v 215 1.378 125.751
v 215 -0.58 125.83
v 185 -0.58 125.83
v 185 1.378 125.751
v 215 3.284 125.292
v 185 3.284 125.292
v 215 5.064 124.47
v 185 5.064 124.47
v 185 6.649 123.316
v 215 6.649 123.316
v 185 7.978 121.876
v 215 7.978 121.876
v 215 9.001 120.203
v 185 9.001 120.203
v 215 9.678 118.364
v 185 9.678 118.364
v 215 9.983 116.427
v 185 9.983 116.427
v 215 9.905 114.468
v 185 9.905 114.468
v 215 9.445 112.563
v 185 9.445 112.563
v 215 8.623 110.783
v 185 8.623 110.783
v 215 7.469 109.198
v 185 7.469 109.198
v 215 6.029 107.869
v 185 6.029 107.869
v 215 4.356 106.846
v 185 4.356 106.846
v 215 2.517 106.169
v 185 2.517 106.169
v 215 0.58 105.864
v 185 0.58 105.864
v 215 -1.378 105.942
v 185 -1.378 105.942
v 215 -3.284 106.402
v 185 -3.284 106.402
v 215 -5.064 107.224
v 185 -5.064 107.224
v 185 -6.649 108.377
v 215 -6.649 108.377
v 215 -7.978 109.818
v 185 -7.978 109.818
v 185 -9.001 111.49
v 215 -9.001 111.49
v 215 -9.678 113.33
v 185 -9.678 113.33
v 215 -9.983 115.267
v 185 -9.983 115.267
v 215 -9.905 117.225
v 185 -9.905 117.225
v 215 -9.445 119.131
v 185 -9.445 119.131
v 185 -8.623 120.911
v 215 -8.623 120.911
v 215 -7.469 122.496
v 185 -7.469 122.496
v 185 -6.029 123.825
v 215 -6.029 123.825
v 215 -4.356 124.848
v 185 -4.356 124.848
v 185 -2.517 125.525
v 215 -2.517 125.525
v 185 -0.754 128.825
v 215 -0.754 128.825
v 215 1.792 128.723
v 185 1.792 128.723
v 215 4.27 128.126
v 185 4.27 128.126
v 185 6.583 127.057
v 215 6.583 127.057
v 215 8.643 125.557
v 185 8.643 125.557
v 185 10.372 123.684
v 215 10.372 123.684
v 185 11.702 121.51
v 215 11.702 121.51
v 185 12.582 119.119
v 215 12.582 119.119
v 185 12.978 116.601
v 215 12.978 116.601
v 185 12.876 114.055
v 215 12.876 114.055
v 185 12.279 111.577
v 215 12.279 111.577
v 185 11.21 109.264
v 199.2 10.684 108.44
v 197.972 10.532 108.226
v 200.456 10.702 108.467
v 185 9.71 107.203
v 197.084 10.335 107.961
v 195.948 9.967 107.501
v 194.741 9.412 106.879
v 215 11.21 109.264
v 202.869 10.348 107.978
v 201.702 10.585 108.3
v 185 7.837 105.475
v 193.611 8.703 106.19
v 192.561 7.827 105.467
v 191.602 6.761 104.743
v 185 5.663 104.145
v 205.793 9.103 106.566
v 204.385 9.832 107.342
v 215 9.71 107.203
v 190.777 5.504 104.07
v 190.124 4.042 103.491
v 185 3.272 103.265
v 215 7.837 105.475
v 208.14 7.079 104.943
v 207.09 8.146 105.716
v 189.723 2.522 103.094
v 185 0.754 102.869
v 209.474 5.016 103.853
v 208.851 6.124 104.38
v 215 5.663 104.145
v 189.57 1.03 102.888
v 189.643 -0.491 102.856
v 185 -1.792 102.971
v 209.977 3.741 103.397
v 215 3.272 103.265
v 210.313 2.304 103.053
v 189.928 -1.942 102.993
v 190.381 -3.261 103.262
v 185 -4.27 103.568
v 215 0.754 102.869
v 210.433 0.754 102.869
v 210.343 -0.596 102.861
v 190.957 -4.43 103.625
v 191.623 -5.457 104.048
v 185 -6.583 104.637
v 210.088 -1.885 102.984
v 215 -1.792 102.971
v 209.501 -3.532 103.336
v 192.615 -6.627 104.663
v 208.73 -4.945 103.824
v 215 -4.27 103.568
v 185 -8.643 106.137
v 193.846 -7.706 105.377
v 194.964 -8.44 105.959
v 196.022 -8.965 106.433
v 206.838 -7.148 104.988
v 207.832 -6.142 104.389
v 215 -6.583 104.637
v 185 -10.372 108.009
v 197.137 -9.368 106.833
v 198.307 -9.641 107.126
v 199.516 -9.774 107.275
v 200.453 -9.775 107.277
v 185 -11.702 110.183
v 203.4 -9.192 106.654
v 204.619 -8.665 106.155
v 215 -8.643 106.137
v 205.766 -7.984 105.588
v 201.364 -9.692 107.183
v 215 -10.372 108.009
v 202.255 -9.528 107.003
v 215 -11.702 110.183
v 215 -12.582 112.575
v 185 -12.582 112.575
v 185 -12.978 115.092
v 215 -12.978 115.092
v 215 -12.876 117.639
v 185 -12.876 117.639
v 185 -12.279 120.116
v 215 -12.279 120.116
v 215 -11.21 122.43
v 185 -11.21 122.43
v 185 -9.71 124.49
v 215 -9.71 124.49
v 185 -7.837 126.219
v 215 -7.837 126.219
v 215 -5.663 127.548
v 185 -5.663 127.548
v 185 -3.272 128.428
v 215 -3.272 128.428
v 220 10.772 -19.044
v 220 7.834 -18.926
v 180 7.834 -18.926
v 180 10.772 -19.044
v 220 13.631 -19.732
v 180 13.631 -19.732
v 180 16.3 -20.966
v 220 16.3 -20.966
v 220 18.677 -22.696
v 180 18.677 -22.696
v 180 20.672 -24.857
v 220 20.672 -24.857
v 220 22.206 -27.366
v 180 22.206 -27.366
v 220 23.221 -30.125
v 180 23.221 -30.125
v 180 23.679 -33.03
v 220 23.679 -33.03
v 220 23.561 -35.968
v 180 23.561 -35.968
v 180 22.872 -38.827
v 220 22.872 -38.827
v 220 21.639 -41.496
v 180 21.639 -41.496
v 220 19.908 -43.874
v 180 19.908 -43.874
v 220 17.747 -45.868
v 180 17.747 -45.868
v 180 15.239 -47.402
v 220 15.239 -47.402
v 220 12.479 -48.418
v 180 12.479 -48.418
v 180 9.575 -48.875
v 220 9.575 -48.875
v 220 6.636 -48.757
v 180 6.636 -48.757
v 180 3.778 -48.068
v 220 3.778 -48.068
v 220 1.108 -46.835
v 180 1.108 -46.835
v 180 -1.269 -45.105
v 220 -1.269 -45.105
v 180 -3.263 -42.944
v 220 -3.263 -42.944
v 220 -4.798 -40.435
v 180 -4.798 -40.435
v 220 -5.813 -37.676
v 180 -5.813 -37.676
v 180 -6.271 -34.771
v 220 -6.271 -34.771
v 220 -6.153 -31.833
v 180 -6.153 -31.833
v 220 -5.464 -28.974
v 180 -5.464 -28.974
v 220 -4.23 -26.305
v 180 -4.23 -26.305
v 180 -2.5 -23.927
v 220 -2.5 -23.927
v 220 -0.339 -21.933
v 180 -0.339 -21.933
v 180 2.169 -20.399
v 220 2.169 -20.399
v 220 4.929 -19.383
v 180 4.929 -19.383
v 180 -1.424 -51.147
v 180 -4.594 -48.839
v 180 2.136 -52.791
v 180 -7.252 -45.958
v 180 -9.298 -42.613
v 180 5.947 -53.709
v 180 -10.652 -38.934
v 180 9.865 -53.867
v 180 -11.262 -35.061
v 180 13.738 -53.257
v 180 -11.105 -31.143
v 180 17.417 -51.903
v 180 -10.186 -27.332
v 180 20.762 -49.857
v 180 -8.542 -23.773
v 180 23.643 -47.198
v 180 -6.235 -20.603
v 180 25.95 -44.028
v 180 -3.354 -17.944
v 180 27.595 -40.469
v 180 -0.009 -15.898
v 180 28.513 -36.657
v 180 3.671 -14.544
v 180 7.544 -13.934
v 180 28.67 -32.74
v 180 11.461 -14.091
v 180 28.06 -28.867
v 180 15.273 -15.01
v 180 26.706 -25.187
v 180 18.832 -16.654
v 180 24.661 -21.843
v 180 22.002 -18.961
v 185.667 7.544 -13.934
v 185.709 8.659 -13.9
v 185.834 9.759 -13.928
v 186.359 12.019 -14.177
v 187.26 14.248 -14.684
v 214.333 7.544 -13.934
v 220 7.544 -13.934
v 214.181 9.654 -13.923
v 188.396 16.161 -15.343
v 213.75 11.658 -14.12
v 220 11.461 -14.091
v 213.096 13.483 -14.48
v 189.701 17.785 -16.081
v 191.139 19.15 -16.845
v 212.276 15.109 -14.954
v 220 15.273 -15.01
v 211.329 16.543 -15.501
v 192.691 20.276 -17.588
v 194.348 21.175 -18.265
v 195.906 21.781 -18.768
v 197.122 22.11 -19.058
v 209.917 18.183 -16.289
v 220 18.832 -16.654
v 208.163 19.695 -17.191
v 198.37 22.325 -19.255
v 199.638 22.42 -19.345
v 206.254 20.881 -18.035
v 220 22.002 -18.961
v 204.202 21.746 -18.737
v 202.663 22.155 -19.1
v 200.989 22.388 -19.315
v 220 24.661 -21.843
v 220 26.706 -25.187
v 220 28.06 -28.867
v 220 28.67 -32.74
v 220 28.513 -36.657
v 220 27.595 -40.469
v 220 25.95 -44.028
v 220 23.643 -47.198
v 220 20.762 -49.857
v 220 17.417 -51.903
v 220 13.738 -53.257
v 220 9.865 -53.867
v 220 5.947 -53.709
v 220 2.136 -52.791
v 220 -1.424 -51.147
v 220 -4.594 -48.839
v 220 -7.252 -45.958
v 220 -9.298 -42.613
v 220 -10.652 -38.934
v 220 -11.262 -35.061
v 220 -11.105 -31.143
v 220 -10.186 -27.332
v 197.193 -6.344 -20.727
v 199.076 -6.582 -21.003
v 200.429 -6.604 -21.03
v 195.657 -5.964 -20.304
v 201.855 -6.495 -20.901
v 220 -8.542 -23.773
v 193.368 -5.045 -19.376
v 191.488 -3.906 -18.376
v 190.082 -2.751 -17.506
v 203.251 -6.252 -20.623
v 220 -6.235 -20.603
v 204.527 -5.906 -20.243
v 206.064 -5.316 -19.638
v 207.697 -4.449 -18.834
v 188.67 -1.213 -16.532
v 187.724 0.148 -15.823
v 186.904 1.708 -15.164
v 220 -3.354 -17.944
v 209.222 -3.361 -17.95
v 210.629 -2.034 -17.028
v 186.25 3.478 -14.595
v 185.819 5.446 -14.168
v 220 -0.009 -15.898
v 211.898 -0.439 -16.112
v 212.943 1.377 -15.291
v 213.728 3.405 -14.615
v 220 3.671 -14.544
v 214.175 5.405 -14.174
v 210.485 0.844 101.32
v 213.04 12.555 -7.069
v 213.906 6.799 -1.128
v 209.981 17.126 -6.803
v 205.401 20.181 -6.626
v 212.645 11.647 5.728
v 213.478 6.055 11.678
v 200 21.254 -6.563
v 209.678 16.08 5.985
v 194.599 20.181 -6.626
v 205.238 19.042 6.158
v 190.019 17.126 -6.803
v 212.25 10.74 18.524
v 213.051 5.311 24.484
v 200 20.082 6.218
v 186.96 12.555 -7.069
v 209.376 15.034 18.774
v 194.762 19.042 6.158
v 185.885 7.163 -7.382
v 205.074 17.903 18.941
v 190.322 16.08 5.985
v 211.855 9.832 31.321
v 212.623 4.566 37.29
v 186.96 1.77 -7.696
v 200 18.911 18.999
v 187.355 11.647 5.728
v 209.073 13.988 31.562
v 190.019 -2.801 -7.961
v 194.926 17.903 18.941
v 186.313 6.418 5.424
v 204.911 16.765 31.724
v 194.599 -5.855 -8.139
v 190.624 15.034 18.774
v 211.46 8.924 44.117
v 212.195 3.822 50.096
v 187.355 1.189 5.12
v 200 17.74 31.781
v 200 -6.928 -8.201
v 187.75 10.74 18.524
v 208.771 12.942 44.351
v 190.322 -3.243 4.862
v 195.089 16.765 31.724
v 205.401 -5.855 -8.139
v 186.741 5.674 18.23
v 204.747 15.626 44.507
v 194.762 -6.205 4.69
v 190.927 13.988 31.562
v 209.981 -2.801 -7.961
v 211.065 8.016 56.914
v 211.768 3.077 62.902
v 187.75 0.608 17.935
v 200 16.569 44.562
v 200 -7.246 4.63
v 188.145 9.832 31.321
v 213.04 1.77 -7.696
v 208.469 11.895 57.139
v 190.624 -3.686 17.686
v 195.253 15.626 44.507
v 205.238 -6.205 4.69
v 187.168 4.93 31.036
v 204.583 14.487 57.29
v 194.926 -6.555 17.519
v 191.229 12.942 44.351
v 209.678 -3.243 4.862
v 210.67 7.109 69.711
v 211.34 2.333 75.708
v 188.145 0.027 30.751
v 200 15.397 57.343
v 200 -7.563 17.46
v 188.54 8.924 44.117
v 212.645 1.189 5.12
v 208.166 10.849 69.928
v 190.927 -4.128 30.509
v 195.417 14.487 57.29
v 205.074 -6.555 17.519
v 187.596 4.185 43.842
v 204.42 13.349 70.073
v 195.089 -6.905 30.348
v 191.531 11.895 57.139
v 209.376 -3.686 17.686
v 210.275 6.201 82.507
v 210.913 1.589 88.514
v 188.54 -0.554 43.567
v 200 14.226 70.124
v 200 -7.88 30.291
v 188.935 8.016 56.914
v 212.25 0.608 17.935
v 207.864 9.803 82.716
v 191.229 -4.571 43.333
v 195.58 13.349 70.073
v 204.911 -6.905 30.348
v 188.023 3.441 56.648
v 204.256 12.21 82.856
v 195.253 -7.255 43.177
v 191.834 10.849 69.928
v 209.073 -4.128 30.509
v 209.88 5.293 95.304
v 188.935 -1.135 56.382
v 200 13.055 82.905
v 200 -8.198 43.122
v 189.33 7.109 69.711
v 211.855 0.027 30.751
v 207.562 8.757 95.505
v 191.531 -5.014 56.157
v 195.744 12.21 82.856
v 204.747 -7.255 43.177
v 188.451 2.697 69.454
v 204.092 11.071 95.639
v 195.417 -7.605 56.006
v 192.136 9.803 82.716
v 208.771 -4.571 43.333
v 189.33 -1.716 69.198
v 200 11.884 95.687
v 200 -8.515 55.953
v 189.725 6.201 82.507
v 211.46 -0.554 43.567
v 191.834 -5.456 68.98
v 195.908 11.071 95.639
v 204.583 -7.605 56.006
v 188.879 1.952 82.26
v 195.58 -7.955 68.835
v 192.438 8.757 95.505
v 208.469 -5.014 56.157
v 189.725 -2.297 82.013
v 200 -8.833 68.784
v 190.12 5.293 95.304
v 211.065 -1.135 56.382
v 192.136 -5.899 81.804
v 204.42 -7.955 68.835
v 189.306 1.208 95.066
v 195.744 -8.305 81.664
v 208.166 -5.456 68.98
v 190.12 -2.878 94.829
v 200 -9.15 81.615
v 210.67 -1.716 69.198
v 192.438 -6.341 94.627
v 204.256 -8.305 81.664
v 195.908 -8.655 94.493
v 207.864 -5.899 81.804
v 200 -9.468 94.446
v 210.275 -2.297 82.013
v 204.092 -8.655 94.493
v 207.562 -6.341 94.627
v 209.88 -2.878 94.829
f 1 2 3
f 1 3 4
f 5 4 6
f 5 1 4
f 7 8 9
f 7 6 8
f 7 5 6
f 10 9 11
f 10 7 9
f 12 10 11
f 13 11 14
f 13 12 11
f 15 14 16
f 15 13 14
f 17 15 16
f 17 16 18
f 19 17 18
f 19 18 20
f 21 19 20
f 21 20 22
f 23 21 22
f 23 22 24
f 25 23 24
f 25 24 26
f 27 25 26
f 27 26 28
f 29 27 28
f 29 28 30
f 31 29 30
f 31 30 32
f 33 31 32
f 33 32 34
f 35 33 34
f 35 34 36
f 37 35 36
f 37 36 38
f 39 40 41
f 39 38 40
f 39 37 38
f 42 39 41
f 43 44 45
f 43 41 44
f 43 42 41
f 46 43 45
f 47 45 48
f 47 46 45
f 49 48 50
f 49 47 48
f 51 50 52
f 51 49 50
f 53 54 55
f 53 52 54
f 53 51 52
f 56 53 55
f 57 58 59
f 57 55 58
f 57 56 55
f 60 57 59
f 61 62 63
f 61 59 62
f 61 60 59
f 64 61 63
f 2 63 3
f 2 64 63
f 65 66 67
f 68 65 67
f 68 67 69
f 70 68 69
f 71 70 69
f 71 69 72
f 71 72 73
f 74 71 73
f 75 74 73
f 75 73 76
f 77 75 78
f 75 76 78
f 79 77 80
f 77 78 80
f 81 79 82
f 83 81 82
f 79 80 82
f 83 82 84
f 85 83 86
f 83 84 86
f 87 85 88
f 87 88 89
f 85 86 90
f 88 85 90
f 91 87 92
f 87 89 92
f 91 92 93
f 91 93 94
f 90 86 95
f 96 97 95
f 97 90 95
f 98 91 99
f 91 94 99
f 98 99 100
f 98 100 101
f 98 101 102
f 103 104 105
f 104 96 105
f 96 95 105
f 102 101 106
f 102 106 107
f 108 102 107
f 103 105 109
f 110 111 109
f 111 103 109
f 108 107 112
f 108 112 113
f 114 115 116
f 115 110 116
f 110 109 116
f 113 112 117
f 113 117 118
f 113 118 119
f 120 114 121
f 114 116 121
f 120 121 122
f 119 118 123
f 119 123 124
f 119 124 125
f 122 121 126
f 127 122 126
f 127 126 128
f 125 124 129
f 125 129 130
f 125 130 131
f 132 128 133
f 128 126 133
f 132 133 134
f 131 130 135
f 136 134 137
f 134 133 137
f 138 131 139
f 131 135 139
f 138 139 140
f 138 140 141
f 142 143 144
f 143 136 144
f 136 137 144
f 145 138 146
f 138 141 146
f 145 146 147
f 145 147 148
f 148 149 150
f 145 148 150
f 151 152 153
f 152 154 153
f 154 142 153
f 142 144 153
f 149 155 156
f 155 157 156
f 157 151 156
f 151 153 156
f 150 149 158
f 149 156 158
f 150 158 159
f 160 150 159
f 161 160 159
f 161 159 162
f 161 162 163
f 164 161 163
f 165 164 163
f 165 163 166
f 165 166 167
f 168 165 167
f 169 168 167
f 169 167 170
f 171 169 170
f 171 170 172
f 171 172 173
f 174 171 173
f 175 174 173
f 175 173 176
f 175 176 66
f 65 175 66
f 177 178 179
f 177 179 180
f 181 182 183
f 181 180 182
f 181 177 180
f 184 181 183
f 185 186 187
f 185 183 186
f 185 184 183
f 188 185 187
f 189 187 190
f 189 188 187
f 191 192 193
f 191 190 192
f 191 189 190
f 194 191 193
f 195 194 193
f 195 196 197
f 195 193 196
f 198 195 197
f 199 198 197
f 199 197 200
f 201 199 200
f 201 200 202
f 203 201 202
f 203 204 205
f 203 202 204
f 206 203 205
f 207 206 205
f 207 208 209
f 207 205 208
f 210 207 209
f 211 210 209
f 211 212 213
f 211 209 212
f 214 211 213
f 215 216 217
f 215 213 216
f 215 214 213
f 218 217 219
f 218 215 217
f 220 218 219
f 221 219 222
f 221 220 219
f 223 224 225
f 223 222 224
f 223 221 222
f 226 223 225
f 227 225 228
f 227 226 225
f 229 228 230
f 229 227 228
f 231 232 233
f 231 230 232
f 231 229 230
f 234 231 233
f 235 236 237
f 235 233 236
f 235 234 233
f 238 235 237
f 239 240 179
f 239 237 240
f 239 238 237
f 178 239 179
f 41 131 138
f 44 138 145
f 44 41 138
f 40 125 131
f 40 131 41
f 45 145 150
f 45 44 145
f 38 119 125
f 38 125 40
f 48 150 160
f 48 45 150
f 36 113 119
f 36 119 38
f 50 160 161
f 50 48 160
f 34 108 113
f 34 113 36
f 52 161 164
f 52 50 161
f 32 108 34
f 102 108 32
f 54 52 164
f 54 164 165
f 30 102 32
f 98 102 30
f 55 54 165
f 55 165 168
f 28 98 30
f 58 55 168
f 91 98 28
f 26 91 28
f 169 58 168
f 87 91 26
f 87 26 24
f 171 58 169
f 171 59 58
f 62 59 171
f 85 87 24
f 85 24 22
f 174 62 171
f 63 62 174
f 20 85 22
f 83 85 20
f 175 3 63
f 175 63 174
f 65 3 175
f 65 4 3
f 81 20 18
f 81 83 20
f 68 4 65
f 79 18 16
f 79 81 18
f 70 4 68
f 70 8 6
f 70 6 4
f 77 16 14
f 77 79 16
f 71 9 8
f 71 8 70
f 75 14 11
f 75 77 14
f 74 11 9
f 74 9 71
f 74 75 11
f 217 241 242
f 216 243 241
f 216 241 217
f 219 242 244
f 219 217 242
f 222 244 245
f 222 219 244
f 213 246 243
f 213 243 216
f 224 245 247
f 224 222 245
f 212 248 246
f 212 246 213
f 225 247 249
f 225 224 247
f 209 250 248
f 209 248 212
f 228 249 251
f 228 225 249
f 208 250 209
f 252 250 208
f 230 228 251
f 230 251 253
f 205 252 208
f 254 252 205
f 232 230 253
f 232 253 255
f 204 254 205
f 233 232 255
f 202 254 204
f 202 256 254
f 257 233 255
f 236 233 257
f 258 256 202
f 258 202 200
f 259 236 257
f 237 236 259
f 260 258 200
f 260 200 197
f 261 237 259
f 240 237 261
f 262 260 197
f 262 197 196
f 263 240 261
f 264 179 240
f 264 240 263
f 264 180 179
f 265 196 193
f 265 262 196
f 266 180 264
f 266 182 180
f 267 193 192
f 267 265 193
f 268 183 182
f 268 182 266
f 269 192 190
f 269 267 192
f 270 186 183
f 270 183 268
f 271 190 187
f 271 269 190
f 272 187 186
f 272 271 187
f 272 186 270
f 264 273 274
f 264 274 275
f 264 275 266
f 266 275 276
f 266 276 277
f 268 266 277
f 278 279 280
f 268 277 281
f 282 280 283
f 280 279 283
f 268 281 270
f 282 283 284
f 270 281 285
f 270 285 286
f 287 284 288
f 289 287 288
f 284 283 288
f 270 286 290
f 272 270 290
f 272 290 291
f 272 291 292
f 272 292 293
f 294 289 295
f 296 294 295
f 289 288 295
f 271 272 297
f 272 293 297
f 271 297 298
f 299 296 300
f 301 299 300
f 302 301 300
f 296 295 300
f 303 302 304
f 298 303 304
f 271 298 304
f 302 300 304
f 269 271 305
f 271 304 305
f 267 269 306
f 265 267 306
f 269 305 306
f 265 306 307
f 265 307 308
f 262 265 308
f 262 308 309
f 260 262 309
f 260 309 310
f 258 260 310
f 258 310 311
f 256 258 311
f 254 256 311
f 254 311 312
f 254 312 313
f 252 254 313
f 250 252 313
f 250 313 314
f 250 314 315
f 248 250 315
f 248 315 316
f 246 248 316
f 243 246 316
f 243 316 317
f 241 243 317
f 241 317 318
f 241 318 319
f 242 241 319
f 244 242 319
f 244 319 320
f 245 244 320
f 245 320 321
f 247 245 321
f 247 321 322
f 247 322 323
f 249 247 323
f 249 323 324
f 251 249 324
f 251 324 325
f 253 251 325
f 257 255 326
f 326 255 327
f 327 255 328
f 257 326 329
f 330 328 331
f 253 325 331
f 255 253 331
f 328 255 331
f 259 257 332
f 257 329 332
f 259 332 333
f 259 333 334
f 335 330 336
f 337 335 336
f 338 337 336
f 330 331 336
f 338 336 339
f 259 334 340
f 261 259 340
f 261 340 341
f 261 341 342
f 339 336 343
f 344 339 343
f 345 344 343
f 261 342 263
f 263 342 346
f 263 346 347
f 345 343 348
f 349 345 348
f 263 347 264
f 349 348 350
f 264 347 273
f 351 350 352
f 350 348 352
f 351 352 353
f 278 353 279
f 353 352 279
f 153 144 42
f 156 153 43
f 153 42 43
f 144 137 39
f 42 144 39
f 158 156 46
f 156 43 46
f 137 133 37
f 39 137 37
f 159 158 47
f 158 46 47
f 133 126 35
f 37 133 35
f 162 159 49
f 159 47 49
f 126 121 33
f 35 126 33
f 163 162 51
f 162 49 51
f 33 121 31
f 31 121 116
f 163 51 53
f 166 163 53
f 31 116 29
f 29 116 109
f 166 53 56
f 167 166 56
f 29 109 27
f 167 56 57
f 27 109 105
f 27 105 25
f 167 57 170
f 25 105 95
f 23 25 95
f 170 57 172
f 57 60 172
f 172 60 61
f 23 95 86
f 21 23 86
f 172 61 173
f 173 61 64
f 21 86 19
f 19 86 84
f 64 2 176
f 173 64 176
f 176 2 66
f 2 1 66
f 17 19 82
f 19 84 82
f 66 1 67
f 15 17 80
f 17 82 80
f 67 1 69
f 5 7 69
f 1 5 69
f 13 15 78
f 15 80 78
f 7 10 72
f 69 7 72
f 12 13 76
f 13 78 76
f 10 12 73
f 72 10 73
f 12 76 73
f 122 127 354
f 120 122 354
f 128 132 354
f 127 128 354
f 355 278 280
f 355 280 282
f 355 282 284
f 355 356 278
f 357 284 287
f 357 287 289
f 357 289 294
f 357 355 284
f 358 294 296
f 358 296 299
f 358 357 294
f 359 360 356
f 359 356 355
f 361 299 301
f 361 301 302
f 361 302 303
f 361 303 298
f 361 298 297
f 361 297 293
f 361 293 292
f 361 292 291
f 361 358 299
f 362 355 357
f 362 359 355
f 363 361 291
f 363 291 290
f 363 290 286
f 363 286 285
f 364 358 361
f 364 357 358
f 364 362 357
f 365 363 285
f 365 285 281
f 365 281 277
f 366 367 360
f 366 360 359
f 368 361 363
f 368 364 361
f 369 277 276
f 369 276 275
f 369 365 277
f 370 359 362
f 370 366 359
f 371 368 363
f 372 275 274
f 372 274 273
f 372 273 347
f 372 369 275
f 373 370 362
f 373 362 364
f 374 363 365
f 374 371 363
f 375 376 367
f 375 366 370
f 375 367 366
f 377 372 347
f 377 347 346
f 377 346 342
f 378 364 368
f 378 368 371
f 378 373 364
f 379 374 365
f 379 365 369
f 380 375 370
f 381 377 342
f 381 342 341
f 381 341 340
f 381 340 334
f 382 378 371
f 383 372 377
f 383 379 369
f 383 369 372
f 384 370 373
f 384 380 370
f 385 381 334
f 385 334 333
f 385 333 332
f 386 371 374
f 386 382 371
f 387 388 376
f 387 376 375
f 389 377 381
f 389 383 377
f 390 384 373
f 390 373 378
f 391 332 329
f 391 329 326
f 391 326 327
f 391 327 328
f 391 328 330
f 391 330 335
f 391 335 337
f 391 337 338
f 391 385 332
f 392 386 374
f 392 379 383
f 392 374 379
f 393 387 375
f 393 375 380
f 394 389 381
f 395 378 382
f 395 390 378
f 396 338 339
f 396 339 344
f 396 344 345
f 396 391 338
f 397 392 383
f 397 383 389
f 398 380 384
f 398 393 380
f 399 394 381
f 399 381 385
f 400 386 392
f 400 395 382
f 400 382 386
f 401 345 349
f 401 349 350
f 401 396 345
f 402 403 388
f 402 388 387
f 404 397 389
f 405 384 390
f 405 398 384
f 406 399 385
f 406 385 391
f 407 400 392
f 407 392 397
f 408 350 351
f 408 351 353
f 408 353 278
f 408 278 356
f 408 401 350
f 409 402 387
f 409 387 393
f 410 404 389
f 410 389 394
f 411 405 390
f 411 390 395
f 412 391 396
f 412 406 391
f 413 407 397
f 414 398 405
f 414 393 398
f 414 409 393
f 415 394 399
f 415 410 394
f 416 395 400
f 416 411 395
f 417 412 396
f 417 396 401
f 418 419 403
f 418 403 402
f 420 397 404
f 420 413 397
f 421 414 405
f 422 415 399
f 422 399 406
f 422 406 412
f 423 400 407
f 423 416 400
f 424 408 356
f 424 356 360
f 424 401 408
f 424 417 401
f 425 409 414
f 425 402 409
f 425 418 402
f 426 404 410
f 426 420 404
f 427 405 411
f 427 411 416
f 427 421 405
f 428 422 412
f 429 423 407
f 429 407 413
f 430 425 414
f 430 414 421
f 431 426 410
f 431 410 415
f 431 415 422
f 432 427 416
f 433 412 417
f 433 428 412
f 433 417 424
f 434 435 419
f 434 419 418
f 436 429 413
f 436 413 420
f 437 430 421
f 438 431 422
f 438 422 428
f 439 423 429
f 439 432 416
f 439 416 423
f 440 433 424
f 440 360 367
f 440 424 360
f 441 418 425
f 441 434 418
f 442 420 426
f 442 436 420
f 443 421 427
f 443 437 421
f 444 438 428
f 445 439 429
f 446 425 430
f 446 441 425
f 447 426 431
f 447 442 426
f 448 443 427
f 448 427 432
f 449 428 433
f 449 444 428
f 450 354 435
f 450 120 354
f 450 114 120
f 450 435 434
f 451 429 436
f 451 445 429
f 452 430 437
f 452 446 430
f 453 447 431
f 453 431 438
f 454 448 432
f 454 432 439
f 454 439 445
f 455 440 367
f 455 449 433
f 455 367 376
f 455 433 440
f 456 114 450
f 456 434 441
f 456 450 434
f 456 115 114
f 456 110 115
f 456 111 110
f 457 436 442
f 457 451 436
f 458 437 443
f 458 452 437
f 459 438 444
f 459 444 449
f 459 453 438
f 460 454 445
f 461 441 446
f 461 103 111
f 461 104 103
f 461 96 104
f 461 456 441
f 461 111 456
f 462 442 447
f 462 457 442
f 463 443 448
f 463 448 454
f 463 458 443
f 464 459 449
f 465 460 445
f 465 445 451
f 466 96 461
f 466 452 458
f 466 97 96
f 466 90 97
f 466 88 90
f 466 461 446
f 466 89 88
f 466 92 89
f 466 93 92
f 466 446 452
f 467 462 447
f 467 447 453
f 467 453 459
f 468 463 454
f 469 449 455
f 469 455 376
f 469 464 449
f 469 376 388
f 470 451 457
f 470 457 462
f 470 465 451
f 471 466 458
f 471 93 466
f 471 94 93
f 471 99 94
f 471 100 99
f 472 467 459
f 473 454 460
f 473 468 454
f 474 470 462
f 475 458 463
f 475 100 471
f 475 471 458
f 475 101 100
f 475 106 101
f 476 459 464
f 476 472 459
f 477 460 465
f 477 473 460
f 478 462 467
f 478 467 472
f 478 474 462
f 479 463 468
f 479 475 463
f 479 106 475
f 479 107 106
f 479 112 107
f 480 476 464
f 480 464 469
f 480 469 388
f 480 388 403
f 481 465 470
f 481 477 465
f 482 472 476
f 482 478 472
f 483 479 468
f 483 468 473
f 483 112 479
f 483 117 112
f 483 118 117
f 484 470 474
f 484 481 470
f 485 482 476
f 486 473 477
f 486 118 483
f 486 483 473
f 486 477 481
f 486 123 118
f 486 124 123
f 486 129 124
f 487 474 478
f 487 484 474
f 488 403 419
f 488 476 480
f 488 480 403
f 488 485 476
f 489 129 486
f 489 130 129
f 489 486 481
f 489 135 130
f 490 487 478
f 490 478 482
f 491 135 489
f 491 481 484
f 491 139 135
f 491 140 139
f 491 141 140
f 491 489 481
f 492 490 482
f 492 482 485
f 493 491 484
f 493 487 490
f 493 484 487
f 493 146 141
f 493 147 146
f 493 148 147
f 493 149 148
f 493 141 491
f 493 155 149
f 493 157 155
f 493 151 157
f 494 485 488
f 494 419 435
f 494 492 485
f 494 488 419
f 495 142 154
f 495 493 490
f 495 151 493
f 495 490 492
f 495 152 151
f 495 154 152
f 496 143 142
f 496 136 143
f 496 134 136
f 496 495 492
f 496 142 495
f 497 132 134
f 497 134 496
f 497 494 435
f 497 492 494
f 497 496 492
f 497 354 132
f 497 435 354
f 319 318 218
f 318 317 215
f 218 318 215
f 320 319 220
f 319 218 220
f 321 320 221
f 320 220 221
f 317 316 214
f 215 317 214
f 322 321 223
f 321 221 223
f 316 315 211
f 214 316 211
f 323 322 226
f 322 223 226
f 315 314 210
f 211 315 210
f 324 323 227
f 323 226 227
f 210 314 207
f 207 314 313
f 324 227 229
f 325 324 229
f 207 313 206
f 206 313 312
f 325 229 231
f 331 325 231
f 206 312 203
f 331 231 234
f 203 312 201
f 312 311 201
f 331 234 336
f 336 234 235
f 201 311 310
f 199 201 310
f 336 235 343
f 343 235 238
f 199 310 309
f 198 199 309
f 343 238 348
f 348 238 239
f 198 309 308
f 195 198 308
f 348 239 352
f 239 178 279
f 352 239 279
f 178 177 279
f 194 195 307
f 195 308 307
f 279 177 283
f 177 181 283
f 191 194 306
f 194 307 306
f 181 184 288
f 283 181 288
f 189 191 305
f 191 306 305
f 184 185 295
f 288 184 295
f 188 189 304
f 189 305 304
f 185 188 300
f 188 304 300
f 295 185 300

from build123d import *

# Parameters (mm, degrees)
CYLINDER027_R          = 10
CYLINDER027_DEPTH      = 100
CYLINDER028_R          = 15
CYLINDER028_DEPTH      = 100
CYLINDER026_R          = 13
CYLINDER026_DEPTH      = 30
CYLINDER025_R          = 20
CYLINDER025_DEPTH      = 40
CUT015_PLACEMENT_ANGLE = 3.326608


with BuildPart() as cylinder027:
    # Cylinder027 → Cylinder027 (new body)
    with BuildSketch(Plane(origin=(50, 0, 150), x_dir=(0, 0, 1), z_dir=(-1, 0, 0))):
        Circle(CYLINDER027_R)
    extrude(amount=CYLINDER027_DEPTH)


with BuildPart() as compound010:
    # Cylinder028 → Cylinder028 (new body)
    with BuildSketch(Plane.ZY.offset(-50)):
        Circle(CYLINDER028_R)
    extrude(amount=CYLINDER028_DEPTH)

    # Compound010: union Cylinder027
    add(cylinder027.part)


with BuildPart() as cone005:
    # Cone001004 → Cone001004 (revolve)
    with BuildSketch(Plane.XZ):
        Polygon((0, 0), (15, 0), (10, 150), (0, 150), align=None)
    revolve(axis=Axis((0, 0, 0), (0, 0, 1)))


with BuildPart() as cylinder026:
    # Cylinder026 → Cylinder026 (new body)
    with BuildSketch(Plane(origin=(15, 0, 150), x_dir=(0, 0, 1), z_dir=(-1, 0, 0))):
        Circle(CYLINDER026_R)
    extrude(amount=CYLINDER026_DEPTH)


with BuildPart() as crank002:
    # Cylinder025 → Cylinder025 (new body)
    with BuildSketch(Plane.ZY.offset(-20)):
        Circle(CYLINDER025_R)
    extrude(amount=CYLINDER025_DEPTH)

    # Fusion003002003004006: union Cone005, Cylinder026
    add(cone005.part)
    add(cylinder026.part)

    # Cut015: cut Compound010
    add(compound010.part, mode=Mode.SUBTRACT)


with BuildPart() as crank002_1:
    # Cut015 placement: moved
    add(crank002.part.moved(Location((200, 8.704146, -33.900411))).rotate(Axis((200, 8.704146, -33.900411), (1, 0, 0)), CUT015_PLACEMENT_ANGLE))


solid = crank002_1.part
